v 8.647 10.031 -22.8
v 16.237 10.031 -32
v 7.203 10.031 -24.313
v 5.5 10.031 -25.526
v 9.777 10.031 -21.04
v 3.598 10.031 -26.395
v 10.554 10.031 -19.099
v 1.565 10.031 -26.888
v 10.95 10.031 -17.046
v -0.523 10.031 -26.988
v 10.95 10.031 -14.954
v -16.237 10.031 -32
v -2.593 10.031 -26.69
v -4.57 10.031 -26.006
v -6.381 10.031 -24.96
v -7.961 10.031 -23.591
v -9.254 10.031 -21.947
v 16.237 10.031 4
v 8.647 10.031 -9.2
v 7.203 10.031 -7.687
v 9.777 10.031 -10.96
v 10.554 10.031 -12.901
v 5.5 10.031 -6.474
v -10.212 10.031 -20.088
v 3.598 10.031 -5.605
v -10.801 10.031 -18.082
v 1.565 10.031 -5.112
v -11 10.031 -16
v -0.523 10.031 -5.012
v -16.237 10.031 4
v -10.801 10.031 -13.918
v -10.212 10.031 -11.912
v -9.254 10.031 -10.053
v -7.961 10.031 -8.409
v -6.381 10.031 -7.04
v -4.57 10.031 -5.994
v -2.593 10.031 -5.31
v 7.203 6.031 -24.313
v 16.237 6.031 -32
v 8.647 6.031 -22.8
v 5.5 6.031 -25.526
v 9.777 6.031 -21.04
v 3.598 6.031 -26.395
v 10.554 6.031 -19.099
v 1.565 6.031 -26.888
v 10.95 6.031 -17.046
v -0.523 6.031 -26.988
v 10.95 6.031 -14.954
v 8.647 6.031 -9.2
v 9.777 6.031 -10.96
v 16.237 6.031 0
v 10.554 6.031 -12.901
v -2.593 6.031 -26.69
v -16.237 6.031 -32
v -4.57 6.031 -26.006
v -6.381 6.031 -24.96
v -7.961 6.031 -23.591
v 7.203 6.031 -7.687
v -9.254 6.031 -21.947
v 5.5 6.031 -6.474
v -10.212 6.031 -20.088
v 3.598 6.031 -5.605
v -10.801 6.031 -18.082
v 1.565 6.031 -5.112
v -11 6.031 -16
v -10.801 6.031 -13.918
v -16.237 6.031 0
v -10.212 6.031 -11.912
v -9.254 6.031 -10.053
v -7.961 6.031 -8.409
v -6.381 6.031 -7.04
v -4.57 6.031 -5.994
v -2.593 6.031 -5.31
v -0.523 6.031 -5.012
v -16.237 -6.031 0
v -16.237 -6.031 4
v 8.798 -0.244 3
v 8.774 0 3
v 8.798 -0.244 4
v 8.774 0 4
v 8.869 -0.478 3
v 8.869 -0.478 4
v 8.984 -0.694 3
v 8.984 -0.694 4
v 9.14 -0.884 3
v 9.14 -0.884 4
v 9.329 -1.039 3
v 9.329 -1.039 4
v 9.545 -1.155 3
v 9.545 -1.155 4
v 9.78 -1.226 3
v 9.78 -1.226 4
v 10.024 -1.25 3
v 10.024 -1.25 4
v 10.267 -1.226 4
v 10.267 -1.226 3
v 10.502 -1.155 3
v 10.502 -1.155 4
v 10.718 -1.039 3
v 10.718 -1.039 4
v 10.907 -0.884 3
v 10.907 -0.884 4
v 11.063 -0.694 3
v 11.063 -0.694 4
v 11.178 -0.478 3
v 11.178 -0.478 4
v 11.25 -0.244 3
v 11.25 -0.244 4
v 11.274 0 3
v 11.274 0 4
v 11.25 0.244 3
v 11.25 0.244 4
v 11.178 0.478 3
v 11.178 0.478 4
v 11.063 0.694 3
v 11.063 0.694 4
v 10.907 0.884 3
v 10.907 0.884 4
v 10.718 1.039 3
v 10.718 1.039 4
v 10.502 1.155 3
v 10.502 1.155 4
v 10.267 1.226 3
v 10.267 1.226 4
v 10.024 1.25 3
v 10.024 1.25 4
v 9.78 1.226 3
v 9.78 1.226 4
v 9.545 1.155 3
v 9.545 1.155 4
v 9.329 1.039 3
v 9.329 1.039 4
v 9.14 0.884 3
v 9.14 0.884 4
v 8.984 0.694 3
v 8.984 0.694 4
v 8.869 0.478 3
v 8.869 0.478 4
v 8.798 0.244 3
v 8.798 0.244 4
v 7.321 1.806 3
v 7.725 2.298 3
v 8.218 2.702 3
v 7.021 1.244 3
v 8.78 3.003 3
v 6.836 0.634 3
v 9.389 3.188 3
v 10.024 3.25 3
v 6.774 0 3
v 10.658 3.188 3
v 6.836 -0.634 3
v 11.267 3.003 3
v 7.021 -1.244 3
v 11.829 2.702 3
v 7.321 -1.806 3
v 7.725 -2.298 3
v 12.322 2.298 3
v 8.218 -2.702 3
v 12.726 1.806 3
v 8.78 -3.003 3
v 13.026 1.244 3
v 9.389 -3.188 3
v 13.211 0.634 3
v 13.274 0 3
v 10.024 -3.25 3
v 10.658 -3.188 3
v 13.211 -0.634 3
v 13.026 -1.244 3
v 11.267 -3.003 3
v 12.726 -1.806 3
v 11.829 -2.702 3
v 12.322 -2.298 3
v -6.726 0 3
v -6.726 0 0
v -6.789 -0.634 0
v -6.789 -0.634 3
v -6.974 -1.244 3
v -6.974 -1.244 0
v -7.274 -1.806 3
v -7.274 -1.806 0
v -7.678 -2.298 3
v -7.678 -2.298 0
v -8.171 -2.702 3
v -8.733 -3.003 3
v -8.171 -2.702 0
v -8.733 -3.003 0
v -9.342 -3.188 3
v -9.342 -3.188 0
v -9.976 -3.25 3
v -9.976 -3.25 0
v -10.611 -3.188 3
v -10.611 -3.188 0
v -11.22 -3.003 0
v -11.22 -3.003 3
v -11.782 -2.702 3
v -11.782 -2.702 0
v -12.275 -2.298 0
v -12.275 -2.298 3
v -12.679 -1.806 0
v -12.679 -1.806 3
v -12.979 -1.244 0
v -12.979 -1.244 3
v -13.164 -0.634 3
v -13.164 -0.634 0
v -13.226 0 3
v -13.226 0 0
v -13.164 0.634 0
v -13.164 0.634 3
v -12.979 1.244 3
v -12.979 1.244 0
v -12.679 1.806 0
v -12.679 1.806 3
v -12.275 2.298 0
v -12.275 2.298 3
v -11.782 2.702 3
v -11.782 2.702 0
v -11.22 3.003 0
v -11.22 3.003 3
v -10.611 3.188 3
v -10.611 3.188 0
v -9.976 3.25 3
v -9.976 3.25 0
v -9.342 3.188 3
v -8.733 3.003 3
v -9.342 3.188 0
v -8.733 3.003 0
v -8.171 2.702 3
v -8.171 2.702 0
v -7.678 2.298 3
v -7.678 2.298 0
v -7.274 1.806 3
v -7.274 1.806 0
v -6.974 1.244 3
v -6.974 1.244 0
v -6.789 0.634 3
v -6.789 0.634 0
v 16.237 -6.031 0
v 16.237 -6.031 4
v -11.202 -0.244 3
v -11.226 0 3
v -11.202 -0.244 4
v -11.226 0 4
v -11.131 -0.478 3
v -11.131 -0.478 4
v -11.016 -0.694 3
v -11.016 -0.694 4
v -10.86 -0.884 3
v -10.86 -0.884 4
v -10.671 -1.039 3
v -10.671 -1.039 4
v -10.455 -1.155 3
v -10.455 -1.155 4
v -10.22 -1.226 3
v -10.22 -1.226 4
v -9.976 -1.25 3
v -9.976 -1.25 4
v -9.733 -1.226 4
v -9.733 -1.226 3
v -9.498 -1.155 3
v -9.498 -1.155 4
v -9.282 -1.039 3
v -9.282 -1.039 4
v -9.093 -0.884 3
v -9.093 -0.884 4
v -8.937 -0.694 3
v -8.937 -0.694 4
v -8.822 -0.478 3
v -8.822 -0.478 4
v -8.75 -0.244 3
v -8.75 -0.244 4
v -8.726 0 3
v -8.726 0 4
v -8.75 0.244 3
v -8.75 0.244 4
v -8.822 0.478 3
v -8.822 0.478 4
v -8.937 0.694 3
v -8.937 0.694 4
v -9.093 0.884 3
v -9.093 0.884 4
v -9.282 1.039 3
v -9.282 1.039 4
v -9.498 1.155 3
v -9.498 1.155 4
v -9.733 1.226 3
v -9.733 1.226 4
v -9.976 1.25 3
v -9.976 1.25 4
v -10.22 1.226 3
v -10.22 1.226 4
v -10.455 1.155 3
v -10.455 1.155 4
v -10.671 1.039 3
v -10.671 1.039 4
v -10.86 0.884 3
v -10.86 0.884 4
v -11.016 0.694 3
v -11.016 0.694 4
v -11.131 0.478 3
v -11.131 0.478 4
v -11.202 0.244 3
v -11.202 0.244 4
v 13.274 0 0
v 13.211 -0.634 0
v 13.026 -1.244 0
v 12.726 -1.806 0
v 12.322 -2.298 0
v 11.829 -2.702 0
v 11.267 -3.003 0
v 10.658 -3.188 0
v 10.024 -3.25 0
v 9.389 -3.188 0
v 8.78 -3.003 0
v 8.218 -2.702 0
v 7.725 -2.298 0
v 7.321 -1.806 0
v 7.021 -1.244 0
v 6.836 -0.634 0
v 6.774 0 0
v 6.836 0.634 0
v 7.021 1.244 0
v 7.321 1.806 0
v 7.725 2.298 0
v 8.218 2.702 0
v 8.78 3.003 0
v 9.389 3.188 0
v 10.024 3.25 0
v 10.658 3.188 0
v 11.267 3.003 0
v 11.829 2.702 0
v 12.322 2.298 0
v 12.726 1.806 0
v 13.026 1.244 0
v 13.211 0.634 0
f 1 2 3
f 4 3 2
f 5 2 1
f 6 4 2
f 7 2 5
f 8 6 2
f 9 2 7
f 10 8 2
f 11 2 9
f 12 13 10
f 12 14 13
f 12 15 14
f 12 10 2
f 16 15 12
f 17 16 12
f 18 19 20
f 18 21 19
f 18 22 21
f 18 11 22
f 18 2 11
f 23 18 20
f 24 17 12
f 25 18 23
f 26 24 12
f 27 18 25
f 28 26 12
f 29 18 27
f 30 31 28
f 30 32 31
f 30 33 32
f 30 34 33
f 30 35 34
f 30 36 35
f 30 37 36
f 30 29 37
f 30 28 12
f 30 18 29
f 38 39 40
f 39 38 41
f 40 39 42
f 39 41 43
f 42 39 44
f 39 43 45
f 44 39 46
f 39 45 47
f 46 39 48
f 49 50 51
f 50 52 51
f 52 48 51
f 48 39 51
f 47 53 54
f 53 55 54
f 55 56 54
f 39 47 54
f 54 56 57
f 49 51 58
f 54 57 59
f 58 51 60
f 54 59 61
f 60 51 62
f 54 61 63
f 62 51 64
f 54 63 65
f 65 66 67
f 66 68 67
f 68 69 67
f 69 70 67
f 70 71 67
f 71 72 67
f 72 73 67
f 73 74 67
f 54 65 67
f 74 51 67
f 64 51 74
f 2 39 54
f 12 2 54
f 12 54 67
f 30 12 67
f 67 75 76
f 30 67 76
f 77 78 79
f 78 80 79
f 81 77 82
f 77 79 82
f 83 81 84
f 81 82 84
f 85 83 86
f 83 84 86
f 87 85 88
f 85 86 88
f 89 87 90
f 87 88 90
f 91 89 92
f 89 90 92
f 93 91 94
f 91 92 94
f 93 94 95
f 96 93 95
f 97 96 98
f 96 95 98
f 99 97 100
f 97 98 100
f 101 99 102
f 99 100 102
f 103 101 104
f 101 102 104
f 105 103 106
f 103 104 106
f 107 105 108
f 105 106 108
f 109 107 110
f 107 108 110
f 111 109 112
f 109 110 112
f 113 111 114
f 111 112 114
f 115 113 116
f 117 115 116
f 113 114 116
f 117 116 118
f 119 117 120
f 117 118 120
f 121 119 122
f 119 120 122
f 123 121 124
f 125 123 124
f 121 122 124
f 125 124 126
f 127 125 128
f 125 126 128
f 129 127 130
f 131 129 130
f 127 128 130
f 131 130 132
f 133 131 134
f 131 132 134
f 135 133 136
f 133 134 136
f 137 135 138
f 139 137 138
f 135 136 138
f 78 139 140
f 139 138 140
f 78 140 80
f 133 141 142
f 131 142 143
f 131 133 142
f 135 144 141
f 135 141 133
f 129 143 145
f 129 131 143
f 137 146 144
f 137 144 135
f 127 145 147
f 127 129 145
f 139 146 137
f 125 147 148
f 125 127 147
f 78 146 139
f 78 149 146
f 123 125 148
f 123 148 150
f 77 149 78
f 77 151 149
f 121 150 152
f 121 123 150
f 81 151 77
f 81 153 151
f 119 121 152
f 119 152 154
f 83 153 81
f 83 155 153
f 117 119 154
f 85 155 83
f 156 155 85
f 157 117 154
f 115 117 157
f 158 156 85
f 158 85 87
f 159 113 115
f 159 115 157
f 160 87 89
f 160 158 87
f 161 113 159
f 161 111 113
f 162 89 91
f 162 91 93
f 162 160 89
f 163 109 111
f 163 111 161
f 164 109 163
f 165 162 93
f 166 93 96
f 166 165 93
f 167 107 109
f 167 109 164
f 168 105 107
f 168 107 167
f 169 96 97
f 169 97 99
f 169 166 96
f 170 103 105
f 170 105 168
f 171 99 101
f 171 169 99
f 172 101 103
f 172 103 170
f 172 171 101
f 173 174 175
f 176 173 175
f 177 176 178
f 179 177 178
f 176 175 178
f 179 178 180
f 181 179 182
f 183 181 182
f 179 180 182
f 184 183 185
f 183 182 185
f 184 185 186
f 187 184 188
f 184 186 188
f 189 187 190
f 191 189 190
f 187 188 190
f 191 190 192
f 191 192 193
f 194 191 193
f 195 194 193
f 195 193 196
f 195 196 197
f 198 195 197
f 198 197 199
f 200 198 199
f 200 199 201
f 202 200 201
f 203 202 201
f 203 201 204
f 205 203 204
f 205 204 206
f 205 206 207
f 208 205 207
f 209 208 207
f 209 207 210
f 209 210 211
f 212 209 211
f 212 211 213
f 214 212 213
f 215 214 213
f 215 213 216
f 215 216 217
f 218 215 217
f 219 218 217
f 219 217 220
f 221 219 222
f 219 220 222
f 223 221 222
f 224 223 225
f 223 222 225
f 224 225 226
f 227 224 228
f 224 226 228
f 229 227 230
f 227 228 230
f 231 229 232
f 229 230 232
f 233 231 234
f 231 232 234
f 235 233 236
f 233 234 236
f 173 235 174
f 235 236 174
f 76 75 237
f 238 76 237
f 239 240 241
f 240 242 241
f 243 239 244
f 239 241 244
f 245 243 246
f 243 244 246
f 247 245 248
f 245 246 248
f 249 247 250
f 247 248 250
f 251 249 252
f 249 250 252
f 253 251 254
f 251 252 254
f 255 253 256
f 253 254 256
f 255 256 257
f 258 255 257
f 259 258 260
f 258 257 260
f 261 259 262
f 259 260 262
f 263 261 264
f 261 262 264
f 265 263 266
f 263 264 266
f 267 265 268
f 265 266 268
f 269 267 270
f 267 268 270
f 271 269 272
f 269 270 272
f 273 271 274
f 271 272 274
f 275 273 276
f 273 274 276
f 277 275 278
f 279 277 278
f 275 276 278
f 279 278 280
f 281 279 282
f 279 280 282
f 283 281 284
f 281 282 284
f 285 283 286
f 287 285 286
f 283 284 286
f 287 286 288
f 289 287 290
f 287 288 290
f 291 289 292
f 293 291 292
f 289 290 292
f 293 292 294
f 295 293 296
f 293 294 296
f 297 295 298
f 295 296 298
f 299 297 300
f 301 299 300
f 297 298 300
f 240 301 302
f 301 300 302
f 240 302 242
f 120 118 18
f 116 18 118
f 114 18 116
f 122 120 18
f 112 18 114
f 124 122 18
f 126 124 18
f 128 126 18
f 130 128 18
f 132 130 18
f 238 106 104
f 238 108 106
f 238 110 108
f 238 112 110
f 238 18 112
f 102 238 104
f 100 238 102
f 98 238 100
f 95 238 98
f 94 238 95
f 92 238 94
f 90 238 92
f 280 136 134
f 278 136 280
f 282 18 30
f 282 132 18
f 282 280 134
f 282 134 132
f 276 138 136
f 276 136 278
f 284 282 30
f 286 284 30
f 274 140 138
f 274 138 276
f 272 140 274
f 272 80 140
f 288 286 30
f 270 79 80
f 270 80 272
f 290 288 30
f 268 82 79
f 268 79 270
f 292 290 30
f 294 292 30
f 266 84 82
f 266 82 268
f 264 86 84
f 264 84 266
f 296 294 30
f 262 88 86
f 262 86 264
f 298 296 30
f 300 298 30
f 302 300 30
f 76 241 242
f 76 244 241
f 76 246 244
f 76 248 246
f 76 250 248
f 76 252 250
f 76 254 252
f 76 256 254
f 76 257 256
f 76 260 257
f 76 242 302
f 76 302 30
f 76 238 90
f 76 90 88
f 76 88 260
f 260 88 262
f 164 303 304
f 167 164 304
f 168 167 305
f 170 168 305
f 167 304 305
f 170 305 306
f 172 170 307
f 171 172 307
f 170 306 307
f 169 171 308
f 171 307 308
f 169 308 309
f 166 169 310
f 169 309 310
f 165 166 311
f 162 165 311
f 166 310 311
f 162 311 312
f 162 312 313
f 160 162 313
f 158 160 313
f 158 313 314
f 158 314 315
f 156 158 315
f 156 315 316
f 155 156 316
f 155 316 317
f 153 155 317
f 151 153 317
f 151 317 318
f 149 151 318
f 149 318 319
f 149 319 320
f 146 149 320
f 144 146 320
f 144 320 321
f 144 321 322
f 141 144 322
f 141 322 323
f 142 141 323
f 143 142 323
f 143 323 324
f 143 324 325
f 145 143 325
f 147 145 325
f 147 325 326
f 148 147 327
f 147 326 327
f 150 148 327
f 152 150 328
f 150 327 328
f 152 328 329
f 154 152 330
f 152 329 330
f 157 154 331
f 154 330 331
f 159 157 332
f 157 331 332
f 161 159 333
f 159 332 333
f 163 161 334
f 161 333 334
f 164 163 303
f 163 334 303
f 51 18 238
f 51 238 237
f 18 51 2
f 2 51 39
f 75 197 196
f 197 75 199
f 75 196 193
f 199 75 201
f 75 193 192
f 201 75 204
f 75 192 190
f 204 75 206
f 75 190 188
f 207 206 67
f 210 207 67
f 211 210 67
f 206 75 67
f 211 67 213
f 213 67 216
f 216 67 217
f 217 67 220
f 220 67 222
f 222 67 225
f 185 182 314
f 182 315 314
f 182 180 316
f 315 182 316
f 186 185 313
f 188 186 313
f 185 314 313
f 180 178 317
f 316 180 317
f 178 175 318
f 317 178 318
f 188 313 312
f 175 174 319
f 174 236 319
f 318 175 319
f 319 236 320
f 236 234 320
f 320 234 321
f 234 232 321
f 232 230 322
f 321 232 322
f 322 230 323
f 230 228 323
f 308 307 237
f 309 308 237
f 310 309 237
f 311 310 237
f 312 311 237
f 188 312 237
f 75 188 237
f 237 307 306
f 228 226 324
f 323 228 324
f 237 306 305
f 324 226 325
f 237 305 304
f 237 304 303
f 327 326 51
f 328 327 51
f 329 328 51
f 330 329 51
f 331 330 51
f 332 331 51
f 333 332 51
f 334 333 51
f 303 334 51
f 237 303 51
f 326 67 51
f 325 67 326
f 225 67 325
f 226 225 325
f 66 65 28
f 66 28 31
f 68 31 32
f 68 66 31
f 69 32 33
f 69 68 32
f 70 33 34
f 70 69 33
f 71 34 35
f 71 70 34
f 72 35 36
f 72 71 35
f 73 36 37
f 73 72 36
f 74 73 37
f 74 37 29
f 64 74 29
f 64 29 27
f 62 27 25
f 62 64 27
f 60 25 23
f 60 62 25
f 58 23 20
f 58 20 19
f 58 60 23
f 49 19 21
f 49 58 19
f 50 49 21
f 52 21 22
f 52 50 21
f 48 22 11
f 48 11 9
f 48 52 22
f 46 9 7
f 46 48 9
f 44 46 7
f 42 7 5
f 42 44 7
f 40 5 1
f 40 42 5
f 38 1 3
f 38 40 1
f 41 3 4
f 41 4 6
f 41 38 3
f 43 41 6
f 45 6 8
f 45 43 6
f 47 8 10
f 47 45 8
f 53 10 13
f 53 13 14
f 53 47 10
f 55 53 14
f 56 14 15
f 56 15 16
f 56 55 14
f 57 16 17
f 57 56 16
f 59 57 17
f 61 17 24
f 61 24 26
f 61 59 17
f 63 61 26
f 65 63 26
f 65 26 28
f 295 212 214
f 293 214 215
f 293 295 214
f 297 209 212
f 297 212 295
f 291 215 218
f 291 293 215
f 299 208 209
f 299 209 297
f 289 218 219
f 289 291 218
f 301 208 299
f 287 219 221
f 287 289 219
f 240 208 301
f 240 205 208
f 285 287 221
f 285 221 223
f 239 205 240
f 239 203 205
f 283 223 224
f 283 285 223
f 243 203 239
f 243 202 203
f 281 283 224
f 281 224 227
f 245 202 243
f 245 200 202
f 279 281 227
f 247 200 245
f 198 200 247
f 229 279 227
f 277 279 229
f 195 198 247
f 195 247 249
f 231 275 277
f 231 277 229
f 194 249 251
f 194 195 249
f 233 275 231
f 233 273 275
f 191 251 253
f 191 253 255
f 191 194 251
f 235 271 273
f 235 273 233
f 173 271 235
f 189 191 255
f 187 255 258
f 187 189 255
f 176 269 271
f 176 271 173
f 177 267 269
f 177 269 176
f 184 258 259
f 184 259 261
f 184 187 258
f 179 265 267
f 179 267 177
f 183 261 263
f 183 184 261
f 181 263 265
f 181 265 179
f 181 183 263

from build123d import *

# Parameters (mm, degrees)
F0_W           = 32.4746801579
F0_H           = 12.0628447294
F1_DEPTH       = 4
F2_D           = 2.5
F2_DEPTH       = 13.5
F2_CBORE_D     = 6.5
F2_CBORE_DEPTH = 3
F2_TIP         = 0.7510757738
F3_W           = 32.4746801579
F3_H           = 4
F3_H_2         = 32
F3_R           = 11
F4_DEPTH       = 4


with BuildPart() as f1:
    # F0 (on Top) → F1 (new body)
    with BuildSketch(Plane.XY):
        Rectangle(F0_W, F0_H)
    extrude(amount=F1_DEPTH)

    # F2
    with Locations(Plane(origin=(0, 0, 0), x_dir=(1, 0, 0), z_dir=(0, 0, -1))):
        with Locations((10.0235303257, 0), (-9.9764696743, 0)):
            CounterBoreHole(F2_D / 2, F2_CBORE_D / 2, F2_CBORE_DEPTH, depth=F2_DEPTH)
            with Locations((0, 0, -(F2_DEPTH + F2_TIP / 2))):  # 118° drill point
                Cone(0, F2_D / 2, F2_TIP, mode=Mode.SUBTRACT)

    # F3 (on face) → F4 (join)
    with BuildSketch(Plane(origin=(0, 6.0314223647, 0), x_dir=(-1, 0, 0), z_dir=(0, 1, 0))):
        with Locations((0, 2)):
            Rectangle(F3_W, F3_H)
        with Locations((0, -16)):
            Rectangle(F3_W, F3_H_2)
        with Locations((0, -16)):
            Circle(F3_R, mode=Mode.SUBTRACT)
    extrude(amount=F4_DEPTH)


solid = f1.part
